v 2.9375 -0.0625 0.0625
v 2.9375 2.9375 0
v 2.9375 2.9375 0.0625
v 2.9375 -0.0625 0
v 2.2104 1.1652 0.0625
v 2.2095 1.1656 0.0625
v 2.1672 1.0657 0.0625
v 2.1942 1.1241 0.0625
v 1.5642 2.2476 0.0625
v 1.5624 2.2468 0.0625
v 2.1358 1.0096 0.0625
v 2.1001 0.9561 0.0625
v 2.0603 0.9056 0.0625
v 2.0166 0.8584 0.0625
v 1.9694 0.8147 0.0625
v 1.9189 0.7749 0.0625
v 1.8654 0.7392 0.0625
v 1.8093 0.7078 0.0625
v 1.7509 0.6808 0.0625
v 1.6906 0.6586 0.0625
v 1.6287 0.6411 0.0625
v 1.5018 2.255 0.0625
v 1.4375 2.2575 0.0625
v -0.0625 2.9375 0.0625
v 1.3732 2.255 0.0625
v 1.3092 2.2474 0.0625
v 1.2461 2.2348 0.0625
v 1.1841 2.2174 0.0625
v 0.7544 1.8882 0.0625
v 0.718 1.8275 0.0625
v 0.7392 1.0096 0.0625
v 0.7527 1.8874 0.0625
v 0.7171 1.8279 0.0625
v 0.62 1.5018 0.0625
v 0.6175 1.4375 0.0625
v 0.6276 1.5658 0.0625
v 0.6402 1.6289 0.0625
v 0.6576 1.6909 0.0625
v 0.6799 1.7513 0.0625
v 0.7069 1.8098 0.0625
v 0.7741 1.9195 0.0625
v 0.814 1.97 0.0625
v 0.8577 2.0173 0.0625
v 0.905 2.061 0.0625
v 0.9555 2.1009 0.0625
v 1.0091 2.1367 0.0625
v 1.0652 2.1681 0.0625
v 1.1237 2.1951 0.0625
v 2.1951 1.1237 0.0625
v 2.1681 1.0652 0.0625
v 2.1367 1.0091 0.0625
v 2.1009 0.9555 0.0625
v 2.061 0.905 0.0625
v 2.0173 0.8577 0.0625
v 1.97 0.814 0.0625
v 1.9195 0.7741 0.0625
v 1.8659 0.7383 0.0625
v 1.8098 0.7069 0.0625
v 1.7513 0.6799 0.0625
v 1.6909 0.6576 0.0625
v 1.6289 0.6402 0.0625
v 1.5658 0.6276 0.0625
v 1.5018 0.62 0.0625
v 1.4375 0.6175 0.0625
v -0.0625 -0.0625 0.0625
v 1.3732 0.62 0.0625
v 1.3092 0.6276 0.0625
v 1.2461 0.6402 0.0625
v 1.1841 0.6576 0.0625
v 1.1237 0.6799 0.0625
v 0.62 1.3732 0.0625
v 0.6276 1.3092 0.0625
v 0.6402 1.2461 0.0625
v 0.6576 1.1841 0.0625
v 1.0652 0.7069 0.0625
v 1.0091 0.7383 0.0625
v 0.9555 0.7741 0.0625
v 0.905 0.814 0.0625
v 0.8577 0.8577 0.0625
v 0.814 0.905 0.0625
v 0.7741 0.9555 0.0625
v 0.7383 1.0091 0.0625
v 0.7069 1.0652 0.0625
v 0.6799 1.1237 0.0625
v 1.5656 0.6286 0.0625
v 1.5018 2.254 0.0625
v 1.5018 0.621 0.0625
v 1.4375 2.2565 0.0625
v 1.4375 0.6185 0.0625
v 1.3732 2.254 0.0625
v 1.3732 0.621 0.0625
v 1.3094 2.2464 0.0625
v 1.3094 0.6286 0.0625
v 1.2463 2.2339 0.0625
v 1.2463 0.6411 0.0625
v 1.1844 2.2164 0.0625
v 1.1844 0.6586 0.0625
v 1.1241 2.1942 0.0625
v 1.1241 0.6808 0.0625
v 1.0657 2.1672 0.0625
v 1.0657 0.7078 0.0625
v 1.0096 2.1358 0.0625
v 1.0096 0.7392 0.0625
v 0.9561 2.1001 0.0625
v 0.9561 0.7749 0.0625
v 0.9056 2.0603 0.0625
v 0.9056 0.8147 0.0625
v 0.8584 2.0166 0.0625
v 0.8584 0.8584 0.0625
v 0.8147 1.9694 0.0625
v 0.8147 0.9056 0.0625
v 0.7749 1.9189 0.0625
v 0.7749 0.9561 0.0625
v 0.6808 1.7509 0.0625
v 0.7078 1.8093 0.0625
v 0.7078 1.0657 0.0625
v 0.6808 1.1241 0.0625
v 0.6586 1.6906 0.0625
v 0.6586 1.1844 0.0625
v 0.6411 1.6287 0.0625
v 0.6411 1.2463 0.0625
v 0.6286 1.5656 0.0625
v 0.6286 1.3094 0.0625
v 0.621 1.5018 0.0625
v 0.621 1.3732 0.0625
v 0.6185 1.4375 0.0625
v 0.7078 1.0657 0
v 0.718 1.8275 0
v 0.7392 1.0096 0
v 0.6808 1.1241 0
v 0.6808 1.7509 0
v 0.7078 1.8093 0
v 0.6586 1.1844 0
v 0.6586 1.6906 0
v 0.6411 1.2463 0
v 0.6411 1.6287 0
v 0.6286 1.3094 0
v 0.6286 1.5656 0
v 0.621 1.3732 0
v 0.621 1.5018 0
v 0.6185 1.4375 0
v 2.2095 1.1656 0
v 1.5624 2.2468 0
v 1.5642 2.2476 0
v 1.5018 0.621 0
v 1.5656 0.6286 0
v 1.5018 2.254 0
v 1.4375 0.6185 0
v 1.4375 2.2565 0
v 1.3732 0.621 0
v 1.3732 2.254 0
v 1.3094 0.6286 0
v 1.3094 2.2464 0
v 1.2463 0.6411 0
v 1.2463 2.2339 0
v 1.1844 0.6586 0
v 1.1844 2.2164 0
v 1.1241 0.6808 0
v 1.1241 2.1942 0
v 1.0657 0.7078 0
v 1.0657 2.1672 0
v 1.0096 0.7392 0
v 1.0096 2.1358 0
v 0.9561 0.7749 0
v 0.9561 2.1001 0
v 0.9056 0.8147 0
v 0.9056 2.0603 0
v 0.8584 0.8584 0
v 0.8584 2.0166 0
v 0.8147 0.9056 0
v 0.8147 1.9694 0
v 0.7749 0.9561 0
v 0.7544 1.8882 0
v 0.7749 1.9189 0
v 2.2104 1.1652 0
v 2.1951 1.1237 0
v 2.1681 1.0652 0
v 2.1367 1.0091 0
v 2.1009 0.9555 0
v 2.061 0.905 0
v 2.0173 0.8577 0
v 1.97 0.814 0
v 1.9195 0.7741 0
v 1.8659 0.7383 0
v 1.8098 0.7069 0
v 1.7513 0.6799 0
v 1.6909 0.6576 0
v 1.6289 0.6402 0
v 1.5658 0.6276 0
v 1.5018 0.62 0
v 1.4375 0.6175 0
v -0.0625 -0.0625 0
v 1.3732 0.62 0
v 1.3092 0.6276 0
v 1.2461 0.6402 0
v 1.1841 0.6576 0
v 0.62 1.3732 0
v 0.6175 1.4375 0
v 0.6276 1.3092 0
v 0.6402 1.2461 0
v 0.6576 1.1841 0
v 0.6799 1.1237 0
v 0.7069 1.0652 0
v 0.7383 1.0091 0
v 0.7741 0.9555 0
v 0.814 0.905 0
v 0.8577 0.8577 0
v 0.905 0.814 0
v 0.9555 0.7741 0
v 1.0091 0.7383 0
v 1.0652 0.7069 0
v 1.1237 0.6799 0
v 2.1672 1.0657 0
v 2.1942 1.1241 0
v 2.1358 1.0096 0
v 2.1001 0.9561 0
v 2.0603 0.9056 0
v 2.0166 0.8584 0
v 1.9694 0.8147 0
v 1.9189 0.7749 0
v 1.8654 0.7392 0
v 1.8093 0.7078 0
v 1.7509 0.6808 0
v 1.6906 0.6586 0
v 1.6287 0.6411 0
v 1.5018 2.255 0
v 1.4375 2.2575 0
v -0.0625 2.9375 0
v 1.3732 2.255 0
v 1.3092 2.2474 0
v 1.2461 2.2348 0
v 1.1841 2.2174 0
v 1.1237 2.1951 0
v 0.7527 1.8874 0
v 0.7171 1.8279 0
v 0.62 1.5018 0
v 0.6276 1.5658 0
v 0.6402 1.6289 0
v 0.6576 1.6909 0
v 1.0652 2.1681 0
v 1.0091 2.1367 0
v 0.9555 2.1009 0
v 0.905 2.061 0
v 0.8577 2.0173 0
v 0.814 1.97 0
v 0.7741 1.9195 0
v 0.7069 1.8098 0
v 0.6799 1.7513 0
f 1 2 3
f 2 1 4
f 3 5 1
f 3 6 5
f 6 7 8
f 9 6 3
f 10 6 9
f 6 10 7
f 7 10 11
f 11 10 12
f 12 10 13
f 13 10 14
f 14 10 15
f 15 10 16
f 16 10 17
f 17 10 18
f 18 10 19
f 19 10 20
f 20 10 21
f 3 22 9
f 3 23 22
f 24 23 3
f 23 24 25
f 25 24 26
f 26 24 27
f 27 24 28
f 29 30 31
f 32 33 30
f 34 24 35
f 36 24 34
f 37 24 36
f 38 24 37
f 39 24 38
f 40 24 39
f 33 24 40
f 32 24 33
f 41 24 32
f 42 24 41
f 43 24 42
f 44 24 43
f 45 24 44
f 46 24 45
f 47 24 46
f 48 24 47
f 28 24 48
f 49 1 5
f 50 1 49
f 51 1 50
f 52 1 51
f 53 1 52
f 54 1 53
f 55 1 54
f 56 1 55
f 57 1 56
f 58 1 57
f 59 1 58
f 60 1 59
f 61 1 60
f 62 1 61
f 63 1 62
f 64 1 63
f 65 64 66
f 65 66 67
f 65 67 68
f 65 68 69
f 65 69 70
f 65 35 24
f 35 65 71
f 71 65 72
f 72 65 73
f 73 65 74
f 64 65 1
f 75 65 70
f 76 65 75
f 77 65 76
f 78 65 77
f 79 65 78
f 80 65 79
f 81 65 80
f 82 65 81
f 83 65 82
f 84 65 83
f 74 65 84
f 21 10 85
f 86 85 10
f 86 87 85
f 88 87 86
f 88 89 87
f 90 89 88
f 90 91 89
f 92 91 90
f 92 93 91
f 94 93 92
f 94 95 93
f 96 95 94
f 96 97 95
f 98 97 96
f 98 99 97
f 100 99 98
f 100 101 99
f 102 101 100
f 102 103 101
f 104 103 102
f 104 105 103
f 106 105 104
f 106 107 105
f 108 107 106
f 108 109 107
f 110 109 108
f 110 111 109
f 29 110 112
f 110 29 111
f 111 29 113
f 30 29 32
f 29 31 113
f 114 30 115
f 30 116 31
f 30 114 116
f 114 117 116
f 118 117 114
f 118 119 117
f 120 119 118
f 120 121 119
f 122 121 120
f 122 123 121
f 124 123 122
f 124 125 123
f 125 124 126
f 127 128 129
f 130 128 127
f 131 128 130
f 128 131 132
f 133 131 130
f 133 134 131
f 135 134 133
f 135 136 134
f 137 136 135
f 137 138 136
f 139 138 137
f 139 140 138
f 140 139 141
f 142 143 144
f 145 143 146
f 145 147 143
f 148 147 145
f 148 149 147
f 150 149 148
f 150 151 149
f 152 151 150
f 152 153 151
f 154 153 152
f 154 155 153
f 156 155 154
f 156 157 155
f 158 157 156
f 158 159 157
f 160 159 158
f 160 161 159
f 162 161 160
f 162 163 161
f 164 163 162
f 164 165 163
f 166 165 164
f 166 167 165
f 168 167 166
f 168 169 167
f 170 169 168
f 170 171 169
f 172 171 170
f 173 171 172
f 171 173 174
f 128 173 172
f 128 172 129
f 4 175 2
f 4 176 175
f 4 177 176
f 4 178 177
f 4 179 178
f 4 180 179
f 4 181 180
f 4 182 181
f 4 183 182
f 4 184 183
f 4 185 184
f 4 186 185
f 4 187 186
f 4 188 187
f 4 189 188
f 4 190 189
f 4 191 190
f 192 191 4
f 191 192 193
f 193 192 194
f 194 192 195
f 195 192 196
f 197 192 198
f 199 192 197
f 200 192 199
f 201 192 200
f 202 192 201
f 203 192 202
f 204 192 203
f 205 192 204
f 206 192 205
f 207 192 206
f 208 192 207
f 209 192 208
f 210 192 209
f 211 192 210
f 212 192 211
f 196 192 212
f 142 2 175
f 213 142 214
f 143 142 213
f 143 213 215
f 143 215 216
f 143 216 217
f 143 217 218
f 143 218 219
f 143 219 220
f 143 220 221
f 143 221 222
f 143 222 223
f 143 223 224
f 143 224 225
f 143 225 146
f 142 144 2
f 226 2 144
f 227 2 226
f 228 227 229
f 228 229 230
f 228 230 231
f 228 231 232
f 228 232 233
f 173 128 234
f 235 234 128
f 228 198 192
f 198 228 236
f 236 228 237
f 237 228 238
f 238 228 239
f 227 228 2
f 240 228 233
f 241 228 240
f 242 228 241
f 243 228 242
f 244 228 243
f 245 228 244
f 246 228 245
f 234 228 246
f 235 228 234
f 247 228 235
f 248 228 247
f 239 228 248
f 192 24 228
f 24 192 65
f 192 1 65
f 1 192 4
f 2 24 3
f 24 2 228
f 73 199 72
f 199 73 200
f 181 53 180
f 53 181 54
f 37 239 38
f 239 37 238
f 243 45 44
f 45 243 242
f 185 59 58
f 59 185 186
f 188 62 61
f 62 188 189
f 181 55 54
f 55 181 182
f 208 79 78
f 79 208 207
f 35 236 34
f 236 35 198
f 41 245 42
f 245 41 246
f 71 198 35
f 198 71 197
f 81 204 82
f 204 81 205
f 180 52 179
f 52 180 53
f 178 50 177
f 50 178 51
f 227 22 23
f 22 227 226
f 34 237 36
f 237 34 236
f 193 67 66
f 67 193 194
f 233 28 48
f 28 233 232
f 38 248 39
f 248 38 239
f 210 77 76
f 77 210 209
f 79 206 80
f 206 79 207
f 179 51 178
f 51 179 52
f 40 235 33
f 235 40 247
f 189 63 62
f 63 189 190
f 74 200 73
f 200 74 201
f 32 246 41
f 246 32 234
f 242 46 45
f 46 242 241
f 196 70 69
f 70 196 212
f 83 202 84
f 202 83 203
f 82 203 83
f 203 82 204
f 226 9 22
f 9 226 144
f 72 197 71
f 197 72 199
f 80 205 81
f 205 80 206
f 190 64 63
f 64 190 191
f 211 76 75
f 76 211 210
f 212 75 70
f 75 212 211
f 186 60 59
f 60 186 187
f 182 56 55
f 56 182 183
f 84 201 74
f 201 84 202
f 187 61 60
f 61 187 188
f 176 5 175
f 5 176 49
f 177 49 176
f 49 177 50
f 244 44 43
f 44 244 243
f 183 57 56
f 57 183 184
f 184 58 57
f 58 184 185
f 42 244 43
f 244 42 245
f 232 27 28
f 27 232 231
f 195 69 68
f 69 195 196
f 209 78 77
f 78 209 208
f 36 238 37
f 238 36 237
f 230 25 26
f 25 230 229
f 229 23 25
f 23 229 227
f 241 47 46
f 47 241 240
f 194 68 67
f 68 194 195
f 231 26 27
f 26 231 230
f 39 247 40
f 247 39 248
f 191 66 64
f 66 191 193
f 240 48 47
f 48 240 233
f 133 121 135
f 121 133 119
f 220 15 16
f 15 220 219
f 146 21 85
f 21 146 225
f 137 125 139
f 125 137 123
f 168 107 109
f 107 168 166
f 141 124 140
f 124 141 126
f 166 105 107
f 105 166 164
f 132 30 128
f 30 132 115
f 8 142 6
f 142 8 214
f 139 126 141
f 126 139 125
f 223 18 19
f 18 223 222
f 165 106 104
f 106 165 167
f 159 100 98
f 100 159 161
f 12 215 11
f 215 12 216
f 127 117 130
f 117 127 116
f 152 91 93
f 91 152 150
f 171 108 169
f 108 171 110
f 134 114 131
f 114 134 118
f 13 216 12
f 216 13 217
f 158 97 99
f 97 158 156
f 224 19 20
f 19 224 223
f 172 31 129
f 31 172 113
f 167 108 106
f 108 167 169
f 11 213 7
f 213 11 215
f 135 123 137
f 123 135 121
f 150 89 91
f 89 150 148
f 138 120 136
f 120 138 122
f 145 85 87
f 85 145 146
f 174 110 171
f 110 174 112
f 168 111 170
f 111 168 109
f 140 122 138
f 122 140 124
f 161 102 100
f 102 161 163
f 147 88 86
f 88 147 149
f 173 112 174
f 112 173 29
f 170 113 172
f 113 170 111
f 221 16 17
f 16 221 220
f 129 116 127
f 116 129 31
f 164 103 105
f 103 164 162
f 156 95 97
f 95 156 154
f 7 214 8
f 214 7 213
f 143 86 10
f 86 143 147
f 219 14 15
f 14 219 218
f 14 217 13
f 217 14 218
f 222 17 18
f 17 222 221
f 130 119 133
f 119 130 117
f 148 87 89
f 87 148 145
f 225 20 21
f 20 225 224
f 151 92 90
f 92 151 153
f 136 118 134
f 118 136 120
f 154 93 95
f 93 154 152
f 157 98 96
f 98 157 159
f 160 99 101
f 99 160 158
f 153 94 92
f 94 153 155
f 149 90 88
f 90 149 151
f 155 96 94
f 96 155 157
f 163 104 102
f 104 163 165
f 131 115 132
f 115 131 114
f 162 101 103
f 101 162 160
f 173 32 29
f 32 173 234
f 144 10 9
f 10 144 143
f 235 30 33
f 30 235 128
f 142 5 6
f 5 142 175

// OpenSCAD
// element100-4.scad
// Flag square tile variant — gear with pennant flag, number "4" on flag.

plate_w = 2 + 7/8;
plate_d = 2 + 7/8;
plate_h = 1/16;
frame_w = 1/16;

hole_d = 3/32;
hole_r = hole_d / 2;

gear_n      = 20;
gear_r_tip  = 1.18;
gear_r_root = 1.00;
gear_r_bore = 0.82;
tooth_hw    = 4.5;
tooth_tip_f = 0.80;

// Pole — same inset_x gap from right rivet column as rivets are from edge
pole_r   = 0.04;
pole_cx  = plate_w - plate_w / 10;
pole_y1  = (plate_d / 20) + hole_r + 0.01;
pole_y2  = plate_d - (plate_d / 20) - hole_r - 0.01;

// Pennant — 2/3 pole height, top at pole top, tip extends well across gear
flag_base_x  = pole_cx;
flag_top_y   = pole_y2;
flag_bot_y   = pole_y2 - (pole_y2 - pole_y1) * 2 / 3;
flag_tip_x   = plate_w / 2 - gear_r_tip * 0.60;
flag_mid_y   = (flag_top_y + flag_bot_y) / 2;
outline_t    = 0.025;

// ── Standard modules ─────────────────────────────────────────────────────────

module rivet_holes() {
    spacing_x = plate_w / 10;
    spacing_y = plate_d / 10;
    inset_x   = spacing_x / 2;
    inset_y   = spacing_y / 2;
    for (i = [0:9]) translate([inset_x + i * spacing_x, inset_y,           -1]) cylinder(h = plate_h + 2, r = hole_r, $fn = 20);
    for (i = [0:9]) translate([inset_x + i * spacing_x, plate_d - inset_y, -1]) cylinder(h = plate_h + 2, r = hole_r, $fn = 20);
    for (i = [0:9]) translate([inset_x,           inset_y + i * spacing_y, -1]) cylinder(h = plate_h + 2, r = hole_r, $fn = 20);
    for (i = [0:9]) translate([plate_w - inset_x, inset_y + i * spacing_y, -1]) cylinder(h = plate_h + 2, r = hole_r, $fn = 20);
}

module frame_with_id(colors = []) {
    id_cover = plate_h / 8;
    region_w = (plate_w + 2 * frame_w) / 6;
    mark_h   = plate_h - id_cover;

    color("black")
    difference() {
        translate([-frame_w, -frame_w, 0])
            cube([plate_w + 2 * frame_w, plate_d + 2 * frame_w, plate_h]);
        translate([0, 0, -0.001])
            cube([plate_w, plate_d, plate_h + 0.002]);
        translate([-frame_w, plate_d, -0.001])
            cube([plate_w + 2 * frame_w, frame_w + 0.002, plate_h + 0.002]);
    }

    for (i = [0:5]) {
        c = (colors[i] != undef) ? colors[i] : "black";
        color(c)
        translate([-frame_w + i * region_w, plate_d, 0])
            cube([region_w, frame_w, mark_h]);
        color("black")
        translate([-frame_w + i * region_w, plate_d, mark_h])
            cube([region_w, frame_w, id_cover]);
    }
}

// Plate with rivet holes only — all other holes are added at assembly level
module plate() {
    difference() {
        color("darkgray") cube([plate_w, plate_d, plate_h]);
        rivet_holes();
    }
}

rivet_h = plate_h;
module rivets() {
    spacing_x = plate_w / 10;
    spacing_y = plate_d / 10;
    inset_x   = spacing_x / 2;
    inset_y   = spacing_y / 2;
    color("lightgray") {
        for (i = [0:9]) translate([inset_x + i * spacing_x, inset_y,           0]) cylinder(h = rivet_h, r = hole_r, $fn = 20);
        for (i = [0:9]) translate([inset_x + i * spacing_x, plate_d - inset_y, 0]) cylinder(h = rivet_h, r = hole_r, $fn = 20);
        for (i = [0:9]) translate([inset_x,           inset_y + i * spacing_y, 0]) cylinder(h = rivet_h, r = hole_r, $fn = 20);
        for (i = [0:9]) translate([plate_w - inset_x, inset_y + i * spacing_y, 0]) cylinder(h = rivet_h, r = hole_r, $fn = 20);
    }
}

// ── Gear 2D helpers ───────────────────────────────────────────────────────────

module gear_tooth_2d() {
    polygon([
        [gear_r_root * cos(-tooth_hw),               gear_r_root * sin(-tooth_hw)],
        [gear_r_tip  * cos(-tooth_hw * tooth_tip_f),  gear_r_tip  * sin(-tooth_hw * tooth_tip_f)],
        [gear_r_tip  * cos( tooth_hw * tooth_tip_f),  gear_r_tip  * sin( tooth_hw * tooth_tip_f)],
        [gear_r_root * cos( tooth_hw),               gear_r_root * sin( tooth_hw)],
    ]);
}

module gear_2d() {
    pitch = 360 / gear_n;
    union() {
        circle(r = gear_r_root, $fn = gear_n * 8);
        for (i = [0:gear_n - 1]) rotate([0, 0, i * pitch]) gear_tooth_2d();
    }
}

// ── Gear holes & gear ────────────────────────────────────────────────────────

module gear_holes() {
    translate([plate_w / 2, plate_d / 2, -1])
    linear_extrude(plate_h + 2)
    difference() {
        gear_2d();
        circle(r = gear_r_bore, $fn = 80);
    }
}

module gear() {
    color("black")
    translate([plate_w / 2, plate_d / 2, 0])
    linear_extrude(plate_h)
    difference() { gear_2d(); circle(r = gear_r_bore, $fn = 80); }
}

// ── Gear bore hole & gear bore ────────────────────────────────────────────────

module gear_bore_holes() {
    translate([plate_w / 2, plate_d / 2, -1])
    linear_extrude(plate_h + 2)
    circle(r = gear_r_bore, $fn = 80);
}

module gear_bore() {
    color([0.80, 0.80, 0.80])
    translate([plate_w / 2, plate_d / 2, 0])
    linear_extrude(plate_h)
    circle(r = gear_r_bore - 0.001, $fn = 80);
}

// ── Flag 2D helpers ───────────────────────────────────────────────────────────

module flag_pennant_2d() {
    polygon([
        [flag_base_x, flag_top_y],
        [flag_base_x, flag_bot_y],
        [flag_tip_x,  flag_mid_y]
    ]);
}

module flag_label_2d() {
    translate([flag_base_x + (flag_tip_x - flag_base_x) * 0.38, flag_mid_y])
    text("4", size = 0.65, halign = "center", valign = "center",
         font = "Liberation Sans:style=Bold");
}

// ── Flag outline hole & flag outline ─────────────────────────────────────────

module flag_outline_holes() {
    translate([0, 0, -1])
    linear_extrude(plate_h + 2)
    difference() {
        offset(delta = outline_t) flag_pennant_2d();
        flag_pennant_2d();
    }
}

module flag_outline() {
    color("darkgray")
    linear_extrude(plate_h)
    difference() {
        offset(delta = outline_t) flag_pennant_2d();
        flag_pennant_2d();
    }
}

// ── Flag pole hole, flag hole → flag pole, flag ───────────────────────────────

module flag_pole_holes() {
    translate([pole_cx - pole_r, pole_y1, -1])
    cube([pole_r * 2, pole_y2 - pole_y1, plate_h + 2]);
}

module flag_pole() {
    color("red")
    translate([pole_cx - pole_r, pole_y1, 0])
    cube([pole_r * 2, pole_y2 - pole_y1, plate_h]);
}

module flag_holes() {
    translate([0, 0, -1])
    linear_extrude(plate_h + 2)
    flag_pennant_2d();
}

module flag() {
    color("red")
    linear_extrude(plate_h)
    flag_pennant_2d();
}

// ── Label hole → label ────────────────────────────────────────────────────────

module label_holes() {
    translate([0, 0, -1])
    linear_extrude(plate_h + 2)
    flag_label_2d();
}

module flag_label() {
    color("darkblue")
    linear_extrude(plate_h)
    flag_label_2d();
}

// ── Assembly ──────────────────────────────────────────────────────────────────
// Each level: difference() cuts the holes INTO the running assembly,
//             union() then adds the feature that fills those holes.
// Innermost = first step; outermost = last step.

frame_with_id(["red", "red", "red", undef, "red", "red"]);

union() {                                           // step 6: add label
    difference() {
        union() {                                   // step 5: add flag pole & flag
            difference() {
                union() {                           // step 4: add flag outline
                    difference() {
                        union() {                   // step 3: add gear bore
                            difference() {
                                union() {           // step 2: add gear
                                    difference() {
                                        // step 1: plate & rivet holes + rivets
                                        union() {
                                            plate();
                                            rivets();
                                        }
                                        gear_holes();       // cut gear holes
                                    }
                                    gear();                 // fill with gear
                                }
                                gear_bore_holes();          // cut gear bore hole
                            }
                            gear_bore();                    // fill with gear bore
                        }
                        flag_outline_holes();               // cut flag outline hole
                    }
                    flag_outline();                         // fill with flag outline
                }
                flag_pole_holes();                          // cut flag pole hole
                flag_holes();                               // cut flag hole
            }
            flag_pole();                                    // fill with flag pole
            flag();                                         // fill with flag
        }
        label_holes();                                      // cut label hole
    }
    flag_label();                                           // fill with label
}
